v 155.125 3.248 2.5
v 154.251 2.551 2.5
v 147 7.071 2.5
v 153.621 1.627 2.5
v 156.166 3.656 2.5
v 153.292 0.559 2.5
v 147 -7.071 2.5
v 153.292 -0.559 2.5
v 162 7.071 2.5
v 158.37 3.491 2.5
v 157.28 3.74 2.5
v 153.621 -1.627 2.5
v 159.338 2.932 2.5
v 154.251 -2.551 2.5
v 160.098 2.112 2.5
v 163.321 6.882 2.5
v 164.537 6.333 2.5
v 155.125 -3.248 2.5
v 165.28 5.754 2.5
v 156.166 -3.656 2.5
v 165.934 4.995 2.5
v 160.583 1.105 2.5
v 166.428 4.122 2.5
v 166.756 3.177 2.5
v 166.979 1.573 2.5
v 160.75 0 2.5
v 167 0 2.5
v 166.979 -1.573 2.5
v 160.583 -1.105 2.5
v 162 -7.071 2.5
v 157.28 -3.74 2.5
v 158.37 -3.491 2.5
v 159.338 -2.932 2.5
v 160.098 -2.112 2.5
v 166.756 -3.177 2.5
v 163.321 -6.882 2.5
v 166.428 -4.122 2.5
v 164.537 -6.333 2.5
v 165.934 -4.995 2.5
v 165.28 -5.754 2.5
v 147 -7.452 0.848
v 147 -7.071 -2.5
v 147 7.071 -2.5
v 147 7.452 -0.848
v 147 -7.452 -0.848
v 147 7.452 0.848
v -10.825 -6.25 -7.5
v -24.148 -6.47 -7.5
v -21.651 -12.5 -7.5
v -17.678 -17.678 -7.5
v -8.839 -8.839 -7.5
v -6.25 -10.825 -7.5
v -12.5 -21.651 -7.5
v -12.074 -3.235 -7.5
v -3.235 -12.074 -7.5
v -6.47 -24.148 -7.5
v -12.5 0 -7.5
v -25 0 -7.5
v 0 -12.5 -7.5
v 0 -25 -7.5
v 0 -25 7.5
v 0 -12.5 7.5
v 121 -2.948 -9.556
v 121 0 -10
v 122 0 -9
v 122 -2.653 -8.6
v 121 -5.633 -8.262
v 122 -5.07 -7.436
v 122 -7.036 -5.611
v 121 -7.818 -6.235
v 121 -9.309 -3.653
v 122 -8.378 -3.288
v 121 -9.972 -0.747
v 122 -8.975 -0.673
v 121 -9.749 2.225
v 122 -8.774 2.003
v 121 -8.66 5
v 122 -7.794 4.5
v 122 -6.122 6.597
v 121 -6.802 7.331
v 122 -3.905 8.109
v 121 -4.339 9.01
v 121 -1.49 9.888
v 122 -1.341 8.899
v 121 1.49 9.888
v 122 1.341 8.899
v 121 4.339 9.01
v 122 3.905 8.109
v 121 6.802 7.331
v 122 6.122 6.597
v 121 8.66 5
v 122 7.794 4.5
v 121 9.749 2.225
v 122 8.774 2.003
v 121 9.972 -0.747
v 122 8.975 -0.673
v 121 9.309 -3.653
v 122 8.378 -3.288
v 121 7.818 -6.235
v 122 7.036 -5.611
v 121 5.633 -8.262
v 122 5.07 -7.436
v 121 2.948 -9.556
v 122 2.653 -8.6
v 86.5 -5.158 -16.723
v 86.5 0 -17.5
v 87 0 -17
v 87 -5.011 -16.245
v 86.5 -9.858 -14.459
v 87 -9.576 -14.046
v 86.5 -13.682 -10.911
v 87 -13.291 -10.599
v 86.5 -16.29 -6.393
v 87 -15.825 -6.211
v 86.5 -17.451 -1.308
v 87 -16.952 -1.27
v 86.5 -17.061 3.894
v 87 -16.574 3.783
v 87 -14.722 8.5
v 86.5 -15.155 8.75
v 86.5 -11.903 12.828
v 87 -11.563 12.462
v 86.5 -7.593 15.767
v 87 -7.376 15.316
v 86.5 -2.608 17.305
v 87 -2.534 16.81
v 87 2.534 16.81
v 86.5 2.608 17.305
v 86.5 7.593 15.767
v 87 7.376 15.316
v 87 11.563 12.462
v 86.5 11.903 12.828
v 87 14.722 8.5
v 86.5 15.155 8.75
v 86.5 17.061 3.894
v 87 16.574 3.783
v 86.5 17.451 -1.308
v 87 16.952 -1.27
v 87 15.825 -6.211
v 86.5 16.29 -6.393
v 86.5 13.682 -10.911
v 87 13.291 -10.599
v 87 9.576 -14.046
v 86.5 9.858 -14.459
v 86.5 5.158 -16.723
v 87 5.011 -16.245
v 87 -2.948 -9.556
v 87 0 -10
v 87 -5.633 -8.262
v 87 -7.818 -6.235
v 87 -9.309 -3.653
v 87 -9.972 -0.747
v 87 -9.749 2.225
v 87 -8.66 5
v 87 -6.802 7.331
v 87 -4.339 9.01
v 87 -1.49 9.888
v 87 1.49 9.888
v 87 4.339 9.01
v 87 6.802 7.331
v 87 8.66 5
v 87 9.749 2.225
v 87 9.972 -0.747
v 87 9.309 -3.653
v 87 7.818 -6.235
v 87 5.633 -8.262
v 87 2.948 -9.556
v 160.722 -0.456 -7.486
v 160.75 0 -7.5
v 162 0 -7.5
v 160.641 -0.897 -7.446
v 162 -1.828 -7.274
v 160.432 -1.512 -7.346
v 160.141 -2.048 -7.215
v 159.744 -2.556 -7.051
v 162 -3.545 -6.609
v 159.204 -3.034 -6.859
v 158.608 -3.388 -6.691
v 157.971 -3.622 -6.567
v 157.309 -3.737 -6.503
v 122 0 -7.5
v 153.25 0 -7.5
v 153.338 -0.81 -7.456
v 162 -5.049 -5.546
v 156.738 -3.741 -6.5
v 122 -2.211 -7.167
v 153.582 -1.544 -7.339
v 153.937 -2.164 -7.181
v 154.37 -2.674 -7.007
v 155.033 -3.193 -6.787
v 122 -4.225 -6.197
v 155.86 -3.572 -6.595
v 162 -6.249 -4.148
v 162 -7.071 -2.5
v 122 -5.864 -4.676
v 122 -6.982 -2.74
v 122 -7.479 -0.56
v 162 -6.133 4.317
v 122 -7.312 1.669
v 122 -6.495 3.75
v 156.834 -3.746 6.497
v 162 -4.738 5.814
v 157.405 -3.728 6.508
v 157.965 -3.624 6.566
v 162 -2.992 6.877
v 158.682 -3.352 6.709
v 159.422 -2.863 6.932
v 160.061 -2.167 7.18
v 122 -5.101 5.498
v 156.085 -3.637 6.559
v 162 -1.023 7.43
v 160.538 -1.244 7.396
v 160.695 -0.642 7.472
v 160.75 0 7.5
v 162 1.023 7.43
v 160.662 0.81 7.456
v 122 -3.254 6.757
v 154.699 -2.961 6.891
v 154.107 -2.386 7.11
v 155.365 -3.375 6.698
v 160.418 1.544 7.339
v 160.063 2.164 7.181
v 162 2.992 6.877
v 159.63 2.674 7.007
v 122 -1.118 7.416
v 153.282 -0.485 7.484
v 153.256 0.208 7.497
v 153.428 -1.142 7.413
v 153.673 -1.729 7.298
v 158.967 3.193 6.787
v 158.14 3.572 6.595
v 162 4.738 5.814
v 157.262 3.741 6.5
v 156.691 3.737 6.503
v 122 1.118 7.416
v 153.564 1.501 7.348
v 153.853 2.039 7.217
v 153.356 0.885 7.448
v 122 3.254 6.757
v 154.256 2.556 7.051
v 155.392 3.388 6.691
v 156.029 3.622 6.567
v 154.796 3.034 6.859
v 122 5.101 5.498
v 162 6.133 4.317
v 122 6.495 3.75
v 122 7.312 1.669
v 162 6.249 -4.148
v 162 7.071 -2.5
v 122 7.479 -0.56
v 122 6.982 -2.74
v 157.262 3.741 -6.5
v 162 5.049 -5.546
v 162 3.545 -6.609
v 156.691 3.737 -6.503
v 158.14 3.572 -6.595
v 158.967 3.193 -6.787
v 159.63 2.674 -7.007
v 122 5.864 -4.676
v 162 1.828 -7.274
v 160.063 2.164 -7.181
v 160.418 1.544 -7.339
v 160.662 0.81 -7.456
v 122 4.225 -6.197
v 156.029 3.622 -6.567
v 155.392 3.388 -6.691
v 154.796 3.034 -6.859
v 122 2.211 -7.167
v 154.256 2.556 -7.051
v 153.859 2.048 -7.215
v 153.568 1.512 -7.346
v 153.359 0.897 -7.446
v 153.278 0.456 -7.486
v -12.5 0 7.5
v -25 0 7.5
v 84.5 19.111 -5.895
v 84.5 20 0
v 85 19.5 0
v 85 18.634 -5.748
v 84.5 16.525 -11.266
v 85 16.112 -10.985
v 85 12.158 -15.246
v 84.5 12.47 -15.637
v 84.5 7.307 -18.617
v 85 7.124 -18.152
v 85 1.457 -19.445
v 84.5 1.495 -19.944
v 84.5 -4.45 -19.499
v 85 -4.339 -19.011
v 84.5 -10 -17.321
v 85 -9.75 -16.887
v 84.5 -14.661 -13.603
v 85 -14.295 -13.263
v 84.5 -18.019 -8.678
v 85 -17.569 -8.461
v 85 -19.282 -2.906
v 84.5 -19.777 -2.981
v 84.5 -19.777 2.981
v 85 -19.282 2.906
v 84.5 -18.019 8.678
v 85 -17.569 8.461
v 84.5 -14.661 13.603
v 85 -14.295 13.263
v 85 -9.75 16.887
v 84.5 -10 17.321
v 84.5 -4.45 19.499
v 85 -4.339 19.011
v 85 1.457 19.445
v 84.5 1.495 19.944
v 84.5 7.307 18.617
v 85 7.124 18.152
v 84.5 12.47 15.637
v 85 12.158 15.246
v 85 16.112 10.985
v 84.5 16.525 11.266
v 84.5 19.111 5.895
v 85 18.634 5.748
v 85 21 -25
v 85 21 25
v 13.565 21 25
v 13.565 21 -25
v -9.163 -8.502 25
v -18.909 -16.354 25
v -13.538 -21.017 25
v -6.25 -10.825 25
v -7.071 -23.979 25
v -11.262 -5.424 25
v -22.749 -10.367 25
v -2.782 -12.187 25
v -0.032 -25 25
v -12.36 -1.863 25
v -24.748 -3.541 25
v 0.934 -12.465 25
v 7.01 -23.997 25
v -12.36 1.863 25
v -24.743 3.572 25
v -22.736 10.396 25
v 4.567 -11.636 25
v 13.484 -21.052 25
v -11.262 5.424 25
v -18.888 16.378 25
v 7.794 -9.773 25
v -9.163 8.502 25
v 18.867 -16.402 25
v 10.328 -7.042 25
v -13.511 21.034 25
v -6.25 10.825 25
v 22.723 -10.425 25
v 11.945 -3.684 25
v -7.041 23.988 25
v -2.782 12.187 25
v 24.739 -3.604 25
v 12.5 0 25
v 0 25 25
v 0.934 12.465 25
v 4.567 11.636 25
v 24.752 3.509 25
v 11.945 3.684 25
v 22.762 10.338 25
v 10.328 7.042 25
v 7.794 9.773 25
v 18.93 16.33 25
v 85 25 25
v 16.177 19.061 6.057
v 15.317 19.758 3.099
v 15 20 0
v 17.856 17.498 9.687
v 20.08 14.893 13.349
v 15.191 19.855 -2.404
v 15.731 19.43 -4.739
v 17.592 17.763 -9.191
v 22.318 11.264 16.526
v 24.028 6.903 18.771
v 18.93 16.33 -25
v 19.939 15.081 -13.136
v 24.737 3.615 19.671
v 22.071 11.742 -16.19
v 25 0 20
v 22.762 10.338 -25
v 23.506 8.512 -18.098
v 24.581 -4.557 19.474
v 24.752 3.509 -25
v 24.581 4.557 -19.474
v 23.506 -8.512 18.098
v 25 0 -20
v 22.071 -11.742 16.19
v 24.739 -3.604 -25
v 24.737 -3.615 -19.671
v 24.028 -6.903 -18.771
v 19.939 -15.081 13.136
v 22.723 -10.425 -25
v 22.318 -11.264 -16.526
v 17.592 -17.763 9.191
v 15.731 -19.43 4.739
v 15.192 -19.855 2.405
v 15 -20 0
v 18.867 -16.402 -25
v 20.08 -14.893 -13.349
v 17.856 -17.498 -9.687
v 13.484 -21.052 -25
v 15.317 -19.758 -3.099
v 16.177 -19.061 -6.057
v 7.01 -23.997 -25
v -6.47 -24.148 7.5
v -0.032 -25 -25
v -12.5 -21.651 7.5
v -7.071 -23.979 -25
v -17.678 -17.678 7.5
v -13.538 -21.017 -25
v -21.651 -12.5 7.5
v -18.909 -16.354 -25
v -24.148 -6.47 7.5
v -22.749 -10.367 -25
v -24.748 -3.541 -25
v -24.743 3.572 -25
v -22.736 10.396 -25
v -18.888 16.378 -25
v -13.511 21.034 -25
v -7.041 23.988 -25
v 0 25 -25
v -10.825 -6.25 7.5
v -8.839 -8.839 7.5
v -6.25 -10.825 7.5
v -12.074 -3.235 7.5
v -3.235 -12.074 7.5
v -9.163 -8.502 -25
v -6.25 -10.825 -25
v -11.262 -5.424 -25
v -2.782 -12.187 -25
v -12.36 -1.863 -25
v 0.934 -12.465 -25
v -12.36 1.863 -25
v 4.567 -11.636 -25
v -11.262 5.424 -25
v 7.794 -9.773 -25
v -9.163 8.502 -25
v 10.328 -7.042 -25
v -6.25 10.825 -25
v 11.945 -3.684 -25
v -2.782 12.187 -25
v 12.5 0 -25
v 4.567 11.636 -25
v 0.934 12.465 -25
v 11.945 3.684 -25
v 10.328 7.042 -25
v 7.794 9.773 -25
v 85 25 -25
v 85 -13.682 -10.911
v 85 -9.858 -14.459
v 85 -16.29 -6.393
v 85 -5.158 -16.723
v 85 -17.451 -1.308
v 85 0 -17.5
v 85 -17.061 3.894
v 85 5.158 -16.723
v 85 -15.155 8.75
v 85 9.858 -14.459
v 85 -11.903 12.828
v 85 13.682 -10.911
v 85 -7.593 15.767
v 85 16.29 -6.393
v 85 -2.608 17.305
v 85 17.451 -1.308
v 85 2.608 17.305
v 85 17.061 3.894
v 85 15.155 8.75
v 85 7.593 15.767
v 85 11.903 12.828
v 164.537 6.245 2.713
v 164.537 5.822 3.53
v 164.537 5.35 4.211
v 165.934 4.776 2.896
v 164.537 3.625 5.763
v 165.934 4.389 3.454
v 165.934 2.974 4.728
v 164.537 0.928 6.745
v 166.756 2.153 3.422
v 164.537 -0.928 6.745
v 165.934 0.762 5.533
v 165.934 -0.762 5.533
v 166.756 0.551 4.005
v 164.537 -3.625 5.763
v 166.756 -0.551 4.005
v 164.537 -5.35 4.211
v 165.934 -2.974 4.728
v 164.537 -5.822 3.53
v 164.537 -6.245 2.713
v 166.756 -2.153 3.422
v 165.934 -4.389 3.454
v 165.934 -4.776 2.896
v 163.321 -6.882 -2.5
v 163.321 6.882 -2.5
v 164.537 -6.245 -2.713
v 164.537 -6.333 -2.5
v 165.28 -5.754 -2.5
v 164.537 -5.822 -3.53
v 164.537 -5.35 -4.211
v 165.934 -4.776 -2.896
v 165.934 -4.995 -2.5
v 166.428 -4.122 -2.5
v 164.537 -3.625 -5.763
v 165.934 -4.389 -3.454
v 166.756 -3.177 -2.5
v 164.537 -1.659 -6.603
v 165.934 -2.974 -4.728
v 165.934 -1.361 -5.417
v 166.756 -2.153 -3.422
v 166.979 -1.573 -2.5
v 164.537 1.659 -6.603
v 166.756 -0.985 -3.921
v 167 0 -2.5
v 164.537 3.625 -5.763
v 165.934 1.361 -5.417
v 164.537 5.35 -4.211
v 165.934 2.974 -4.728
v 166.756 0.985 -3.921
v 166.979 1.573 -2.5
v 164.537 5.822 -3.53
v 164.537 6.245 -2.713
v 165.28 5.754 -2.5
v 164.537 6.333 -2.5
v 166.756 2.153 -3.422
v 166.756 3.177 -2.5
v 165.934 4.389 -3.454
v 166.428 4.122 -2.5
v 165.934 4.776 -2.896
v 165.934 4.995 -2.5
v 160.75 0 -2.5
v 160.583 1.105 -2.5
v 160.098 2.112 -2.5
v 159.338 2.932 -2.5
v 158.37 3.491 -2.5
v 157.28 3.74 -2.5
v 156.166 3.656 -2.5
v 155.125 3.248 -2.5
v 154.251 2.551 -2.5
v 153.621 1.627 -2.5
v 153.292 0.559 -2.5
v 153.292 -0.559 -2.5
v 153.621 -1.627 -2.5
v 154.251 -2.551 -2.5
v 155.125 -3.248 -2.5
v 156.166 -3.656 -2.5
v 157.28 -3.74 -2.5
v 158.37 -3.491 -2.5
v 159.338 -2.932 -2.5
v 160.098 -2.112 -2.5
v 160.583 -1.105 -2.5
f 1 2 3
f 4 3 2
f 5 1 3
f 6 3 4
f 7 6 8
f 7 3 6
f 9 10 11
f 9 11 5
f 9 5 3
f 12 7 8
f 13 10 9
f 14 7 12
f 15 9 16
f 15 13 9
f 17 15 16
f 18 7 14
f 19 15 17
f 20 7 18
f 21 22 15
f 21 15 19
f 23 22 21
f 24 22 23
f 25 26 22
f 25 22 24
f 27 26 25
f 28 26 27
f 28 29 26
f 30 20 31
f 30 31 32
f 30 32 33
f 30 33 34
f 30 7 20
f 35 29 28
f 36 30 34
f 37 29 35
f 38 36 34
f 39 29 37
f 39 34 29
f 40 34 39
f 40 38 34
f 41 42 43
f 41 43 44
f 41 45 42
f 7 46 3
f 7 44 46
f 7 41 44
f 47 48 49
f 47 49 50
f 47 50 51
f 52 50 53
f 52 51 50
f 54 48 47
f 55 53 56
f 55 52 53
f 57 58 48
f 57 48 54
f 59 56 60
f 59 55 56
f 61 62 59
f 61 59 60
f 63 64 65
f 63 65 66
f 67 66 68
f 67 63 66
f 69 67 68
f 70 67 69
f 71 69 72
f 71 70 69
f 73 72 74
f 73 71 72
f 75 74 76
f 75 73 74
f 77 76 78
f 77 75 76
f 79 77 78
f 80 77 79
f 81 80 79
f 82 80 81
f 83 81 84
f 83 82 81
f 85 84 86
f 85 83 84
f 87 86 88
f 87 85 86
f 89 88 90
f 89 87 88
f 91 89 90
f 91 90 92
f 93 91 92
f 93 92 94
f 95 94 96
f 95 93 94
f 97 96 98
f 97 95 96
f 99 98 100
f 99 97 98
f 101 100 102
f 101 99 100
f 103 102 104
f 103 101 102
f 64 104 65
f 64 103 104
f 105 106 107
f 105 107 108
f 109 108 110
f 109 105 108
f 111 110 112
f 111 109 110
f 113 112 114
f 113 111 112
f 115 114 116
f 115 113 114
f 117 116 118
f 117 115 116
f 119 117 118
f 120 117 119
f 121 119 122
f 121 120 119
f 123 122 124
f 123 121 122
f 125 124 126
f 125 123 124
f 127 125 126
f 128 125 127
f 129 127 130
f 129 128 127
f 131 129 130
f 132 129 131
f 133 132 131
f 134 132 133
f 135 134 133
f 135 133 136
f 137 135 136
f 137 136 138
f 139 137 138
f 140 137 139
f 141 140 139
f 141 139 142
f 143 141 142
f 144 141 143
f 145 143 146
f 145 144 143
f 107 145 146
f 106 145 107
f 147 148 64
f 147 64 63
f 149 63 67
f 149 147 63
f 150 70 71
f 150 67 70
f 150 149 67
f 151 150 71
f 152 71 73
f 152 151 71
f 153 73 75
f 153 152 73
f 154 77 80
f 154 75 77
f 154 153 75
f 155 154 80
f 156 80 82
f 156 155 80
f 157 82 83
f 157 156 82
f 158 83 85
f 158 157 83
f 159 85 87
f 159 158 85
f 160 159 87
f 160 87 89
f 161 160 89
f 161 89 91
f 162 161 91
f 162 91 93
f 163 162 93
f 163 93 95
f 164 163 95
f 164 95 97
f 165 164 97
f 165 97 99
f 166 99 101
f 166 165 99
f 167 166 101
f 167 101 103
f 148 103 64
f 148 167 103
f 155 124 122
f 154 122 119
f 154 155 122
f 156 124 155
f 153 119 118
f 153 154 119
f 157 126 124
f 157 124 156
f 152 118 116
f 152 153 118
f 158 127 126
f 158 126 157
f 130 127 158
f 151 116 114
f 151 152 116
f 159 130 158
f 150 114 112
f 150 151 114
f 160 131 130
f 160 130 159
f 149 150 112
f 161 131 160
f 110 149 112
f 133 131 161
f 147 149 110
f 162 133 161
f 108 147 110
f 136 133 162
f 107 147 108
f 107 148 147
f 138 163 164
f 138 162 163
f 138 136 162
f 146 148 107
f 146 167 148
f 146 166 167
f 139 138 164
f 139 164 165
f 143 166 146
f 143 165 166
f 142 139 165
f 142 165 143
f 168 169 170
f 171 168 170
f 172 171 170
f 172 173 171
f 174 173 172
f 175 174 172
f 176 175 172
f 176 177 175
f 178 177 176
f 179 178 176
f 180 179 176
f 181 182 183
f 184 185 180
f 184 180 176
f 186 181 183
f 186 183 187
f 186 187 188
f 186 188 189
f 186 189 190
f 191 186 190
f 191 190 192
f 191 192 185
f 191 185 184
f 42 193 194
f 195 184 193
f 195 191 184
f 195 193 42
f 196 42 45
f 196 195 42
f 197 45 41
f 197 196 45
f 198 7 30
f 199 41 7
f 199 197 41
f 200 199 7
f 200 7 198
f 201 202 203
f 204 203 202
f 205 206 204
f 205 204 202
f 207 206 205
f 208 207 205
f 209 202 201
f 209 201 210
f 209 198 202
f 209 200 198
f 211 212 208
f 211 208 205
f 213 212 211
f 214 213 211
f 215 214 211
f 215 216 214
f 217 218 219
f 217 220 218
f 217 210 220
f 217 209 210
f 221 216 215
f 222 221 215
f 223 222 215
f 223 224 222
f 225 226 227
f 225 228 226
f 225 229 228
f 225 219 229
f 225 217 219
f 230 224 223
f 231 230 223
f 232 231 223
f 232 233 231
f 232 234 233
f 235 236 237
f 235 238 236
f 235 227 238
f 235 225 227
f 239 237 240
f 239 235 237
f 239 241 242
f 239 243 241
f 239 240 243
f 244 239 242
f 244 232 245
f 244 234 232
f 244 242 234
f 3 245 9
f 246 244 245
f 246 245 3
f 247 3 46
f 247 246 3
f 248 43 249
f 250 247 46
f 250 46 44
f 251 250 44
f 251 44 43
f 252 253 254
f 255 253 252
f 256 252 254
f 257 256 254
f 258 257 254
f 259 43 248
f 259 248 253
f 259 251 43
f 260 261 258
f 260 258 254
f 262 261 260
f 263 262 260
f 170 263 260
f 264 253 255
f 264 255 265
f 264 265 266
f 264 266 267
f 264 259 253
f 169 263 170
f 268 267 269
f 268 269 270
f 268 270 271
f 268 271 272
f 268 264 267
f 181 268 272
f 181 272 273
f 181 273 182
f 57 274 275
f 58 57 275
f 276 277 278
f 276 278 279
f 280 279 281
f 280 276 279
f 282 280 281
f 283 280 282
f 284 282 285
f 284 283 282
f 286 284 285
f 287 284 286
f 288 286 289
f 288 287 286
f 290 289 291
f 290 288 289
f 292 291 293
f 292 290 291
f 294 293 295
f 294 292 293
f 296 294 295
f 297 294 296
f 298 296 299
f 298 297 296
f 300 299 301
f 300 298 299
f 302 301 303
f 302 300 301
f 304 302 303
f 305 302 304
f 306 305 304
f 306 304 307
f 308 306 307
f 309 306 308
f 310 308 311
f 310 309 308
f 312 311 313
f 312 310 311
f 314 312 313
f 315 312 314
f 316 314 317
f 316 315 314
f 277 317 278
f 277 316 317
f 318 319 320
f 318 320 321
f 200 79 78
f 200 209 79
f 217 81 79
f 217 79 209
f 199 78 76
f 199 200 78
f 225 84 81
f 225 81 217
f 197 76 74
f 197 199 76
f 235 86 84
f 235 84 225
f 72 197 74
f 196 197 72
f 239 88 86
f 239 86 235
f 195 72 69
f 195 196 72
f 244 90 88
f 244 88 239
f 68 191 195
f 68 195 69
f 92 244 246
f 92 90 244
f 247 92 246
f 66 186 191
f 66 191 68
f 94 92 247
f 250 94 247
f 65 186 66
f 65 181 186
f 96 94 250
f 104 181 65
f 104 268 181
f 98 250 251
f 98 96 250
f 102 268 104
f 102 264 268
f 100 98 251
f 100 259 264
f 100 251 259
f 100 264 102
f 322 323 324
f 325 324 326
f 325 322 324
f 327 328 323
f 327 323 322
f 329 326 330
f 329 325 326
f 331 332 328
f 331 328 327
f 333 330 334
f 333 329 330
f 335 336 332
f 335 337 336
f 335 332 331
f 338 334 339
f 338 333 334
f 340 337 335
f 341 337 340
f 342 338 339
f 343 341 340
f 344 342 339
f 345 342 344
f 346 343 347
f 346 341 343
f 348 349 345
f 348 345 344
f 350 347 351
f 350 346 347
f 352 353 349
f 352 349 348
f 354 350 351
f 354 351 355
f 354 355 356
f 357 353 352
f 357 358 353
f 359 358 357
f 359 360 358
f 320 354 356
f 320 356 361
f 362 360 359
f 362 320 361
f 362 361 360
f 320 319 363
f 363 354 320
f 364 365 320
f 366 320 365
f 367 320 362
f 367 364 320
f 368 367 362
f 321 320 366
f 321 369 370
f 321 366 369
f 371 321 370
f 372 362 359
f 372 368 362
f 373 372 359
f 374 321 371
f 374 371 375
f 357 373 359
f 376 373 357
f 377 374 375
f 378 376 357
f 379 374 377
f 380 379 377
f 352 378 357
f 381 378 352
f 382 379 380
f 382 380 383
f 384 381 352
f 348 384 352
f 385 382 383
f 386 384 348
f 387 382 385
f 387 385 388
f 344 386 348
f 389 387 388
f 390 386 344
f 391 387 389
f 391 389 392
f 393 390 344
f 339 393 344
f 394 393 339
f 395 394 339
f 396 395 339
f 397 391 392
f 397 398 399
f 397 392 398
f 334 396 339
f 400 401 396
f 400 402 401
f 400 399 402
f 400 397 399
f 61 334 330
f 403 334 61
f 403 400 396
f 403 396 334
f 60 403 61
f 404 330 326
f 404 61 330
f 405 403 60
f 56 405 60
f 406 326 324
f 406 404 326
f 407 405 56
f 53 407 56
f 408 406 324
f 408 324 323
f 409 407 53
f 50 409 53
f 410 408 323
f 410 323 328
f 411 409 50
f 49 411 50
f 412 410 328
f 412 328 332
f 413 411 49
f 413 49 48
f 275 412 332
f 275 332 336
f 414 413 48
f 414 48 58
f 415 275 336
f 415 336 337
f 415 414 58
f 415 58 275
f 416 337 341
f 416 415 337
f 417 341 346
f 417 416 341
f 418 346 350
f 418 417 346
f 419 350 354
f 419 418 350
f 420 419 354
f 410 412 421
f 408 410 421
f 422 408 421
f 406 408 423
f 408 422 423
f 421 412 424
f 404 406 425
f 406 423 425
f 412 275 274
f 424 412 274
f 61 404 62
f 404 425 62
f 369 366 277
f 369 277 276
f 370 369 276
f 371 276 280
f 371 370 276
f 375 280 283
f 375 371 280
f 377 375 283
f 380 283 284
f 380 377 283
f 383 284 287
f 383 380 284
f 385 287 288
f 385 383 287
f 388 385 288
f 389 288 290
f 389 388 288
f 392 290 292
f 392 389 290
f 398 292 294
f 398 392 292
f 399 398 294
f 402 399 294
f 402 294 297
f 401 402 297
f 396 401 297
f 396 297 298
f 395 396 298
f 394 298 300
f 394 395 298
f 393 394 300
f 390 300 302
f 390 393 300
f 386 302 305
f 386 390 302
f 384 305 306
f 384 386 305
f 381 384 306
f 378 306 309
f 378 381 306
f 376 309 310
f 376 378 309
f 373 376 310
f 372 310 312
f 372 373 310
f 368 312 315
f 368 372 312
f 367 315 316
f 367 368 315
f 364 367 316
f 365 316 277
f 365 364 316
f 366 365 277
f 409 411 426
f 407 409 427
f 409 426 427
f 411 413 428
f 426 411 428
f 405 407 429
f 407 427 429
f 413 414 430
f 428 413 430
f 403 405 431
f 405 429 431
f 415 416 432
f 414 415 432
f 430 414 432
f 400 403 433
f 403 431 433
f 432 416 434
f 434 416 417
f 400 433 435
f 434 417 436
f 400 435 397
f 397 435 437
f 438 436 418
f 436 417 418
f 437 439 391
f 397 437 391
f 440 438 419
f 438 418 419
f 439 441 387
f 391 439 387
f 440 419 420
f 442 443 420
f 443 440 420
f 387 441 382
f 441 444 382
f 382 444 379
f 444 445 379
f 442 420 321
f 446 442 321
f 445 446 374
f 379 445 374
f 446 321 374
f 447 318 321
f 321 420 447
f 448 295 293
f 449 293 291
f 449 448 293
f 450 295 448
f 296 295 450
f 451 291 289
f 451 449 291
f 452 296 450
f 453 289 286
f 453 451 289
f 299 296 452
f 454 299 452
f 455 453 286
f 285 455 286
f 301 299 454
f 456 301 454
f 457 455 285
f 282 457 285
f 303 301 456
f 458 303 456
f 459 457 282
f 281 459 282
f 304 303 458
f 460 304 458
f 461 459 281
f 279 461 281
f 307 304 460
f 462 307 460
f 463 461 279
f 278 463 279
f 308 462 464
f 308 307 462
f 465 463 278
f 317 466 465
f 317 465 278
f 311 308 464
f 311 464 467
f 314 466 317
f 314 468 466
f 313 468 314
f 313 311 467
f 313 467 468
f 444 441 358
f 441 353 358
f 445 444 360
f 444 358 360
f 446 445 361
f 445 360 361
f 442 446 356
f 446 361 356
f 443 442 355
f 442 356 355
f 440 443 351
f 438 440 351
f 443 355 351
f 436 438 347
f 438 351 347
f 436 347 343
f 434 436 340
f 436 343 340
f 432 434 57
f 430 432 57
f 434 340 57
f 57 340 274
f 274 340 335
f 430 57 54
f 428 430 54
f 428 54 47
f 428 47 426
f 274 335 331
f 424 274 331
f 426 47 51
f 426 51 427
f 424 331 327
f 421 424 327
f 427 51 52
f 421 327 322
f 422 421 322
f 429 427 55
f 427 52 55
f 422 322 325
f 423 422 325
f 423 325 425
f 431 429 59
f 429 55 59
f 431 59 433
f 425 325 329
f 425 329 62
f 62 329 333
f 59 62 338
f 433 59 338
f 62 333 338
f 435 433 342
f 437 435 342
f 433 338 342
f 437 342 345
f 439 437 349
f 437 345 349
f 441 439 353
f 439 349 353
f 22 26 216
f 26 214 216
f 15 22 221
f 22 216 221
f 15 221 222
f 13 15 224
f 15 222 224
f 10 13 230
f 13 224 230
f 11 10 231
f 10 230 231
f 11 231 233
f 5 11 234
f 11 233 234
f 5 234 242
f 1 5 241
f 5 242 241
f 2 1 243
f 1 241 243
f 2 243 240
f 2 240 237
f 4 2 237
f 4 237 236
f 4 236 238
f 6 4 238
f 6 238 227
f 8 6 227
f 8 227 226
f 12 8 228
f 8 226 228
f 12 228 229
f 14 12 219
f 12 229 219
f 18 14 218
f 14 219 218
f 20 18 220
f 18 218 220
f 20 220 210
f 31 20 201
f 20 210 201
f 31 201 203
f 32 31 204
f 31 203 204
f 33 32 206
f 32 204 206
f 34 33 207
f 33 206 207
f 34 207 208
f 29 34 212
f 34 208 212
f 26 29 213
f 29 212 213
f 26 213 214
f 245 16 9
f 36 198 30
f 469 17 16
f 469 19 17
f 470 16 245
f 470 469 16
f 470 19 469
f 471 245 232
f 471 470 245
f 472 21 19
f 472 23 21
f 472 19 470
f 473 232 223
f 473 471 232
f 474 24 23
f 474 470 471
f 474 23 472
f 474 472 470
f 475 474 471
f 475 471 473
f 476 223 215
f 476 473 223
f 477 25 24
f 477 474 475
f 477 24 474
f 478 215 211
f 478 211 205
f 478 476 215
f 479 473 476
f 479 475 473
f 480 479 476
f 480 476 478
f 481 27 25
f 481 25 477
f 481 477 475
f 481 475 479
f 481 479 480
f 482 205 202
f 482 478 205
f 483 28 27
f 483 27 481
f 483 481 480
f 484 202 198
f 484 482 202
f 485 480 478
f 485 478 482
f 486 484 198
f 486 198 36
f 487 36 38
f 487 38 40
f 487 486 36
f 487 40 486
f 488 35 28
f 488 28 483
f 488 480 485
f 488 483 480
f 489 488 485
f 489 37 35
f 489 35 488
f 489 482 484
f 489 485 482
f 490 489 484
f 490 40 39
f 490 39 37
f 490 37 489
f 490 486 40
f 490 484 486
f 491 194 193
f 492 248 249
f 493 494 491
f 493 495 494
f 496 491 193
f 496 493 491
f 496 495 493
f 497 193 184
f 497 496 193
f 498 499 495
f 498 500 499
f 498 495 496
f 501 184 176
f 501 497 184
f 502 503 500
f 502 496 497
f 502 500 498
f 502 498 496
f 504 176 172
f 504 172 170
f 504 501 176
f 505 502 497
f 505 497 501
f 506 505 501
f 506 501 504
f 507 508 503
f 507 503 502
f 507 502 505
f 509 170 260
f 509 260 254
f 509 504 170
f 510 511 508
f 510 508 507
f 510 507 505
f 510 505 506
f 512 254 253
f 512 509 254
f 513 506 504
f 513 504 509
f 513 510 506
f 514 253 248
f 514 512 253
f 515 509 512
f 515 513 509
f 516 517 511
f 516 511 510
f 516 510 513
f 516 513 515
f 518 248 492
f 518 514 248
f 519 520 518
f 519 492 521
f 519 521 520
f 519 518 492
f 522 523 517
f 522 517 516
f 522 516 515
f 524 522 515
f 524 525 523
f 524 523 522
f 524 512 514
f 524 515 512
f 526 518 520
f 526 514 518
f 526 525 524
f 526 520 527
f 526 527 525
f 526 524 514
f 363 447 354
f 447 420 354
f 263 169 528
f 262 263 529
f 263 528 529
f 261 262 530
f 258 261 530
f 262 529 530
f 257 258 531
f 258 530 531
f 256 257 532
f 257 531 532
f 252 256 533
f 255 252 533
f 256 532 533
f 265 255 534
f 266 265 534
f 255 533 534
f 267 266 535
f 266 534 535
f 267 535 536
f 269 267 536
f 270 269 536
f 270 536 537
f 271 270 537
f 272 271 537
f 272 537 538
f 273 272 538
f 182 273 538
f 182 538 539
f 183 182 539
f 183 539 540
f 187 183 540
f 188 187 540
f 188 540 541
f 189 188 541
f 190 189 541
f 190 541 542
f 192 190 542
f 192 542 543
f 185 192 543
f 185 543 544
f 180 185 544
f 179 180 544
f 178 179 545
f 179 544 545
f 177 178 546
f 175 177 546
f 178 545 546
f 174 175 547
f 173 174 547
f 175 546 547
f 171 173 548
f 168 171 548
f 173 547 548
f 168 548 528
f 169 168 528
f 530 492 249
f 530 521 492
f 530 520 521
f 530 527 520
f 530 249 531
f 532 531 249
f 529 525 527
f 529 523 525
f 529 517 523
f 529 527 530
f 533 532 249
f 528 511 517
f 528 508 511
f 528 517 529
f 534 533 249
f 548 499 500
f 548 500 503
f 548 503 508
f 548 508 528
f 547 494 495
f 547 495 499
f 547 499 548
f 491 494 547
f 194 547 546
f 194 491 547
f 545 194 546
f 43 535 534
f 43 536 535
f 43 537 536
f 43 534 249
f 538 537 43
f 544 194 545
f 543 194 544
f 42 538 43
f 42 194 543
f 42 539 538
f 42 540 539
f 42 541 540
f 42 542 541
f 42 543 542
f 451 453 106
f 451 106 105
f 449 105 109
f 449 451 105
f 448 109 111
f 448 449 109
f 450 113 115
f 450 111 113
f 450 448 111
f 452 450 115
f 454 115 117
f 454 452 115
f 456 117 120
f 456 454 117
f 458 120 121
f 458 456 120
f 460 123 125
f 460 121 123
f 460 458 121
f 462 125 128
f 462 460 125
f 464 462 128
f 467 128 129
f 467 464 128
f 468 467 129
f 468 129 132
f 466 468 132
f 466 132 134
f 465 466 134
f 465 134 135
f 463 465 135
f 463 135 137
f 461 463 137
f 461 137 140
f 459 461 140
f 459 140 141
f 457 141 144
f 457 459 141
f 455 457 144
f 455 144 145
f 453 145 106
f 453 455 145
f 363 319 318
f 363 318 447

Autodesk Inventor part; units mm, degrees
ref_plane "YZ Plane" through (0, 0, 0) normal (1, 0, 0) x (0, 1, 0)
ref_plane "XZ Plane" through (0, 0, 0) normal (0, 1, 0) x (-1, 0, 0)
ref_plane "XY Plane" through (0, 0, 0) normal (0, 0, 1) x (1, 0, 0)
sketch "Sketch1" plane through (0, 0, 0) normal (0, 0, 1) x (1, 0, 0)
  circle A0 centre (0, 0) radius 25
  dimension "d0" = 50
extrude "Extrusion1" add sketch "Sketch1" along normal mid plane 50
sketch "Sketch2" plane through (0, 0, 0) normal (1, 0, 0) x (0, 1, 0)
  circle A0 centre (0, 0) radius 20
  line L0 (25, 25) -> (-25, 25) projected
  line L1 (-25, -25) -> (25, -25) projected
  line L2 (25, 25) -> (21, 25)
  line L3 (21, 25) -> (21, -25)
  line L4 (21, -25) -> (25, -25)
  line L5 (25, -25) -> (25, 25)
  dimension "d3" = 40
  dimension "d4" = 4
extrude "Extrusion2" add sketch "Sketch2" along normal blind 85
sketch "Sketch3" plane through (0, 0, 0) normal (0, 0, 1) x (1, 0, 0)
  circle A0 centre (0, 0) radius 12.5
  dimension "d7" = 25
extrude "Extrusion3" cut sketch "Sketch3" along normal through all both and the other way through all
sketch "Sketch4" plane through (85, 0, 0) normal (1, 0, 0) x (0, 0, -1)
  circle A0 centre (0, 0) radius 17.5
  dimension "d10" = 35
extrude "Extrusion4" add sketch "Sketch4" along normal blind 2
sketch "Sketch5" plane through (87, 0, 0) normal (1, 0, 0) x (0, 0, -1)
  circle A0 centre (0, 0) radius 10
  dimension "d13" = 20
extrude "Extrusion5" add sketch "Sketch5" along normal blind 35
sketch "Sketch6" plane through (122, 0, 0) normal (1, 0, 0) x (0, 0, -1)
  circle A0 centre (0, 0) radius 7.5
  dimension "d16" = 15
extrude "Extrusion6" add sketch "Sketch6" along normal blind 45
sketch "Sketch7" plane through (0, 0, 0) normal (0, 0, 1) x (1, 0, 0)
  circle A0 centre (157, 0) radius 3.75
  line L0 (167, -7.5) -> (167, 7.5) projected
  point P0 (0, 0)
  dimension "d19" = 7.5
  dimension "d20" = 10
extrude "Extrusion7" cut sketch "Sketch7" along normal through all both and the other way through all
chamfer "Chamfer1" distance 0.5 angle 45 2 edges at (85, -20, 0) (87, 0, 17.5)
chamfer "Chamfer2" distance 1 angle 45 1 edges at (122, 0, 10)
fillet "Fillet1" radius 5 1 edges at (167, 0, 7.5)
sketch "Sketch8" plane through (0, 0, 0) normal (0, 0, 1) x (1, 0, 0)
  arc A0 (-12.5, 0) -> (0, -12.5) centre (0, 0) ccw
  arc A1 (-25, 0) -> (0, -25) centre (0, 0) ccw
  line L0 (0, 0) -> (-25, 0)
  line L1 (0, 0) -> (0, -25)
  dimension "d30" = 25
  dimension "d31" = 50
extrude "Extrusion8" cut sketch "Sketch8" along normal mid plane 15 contours A0 L1 A1 L0
sketch "Sketch9" plane through (0, 0, 0) normal (0, 1, 0) x (-1, 0, 0)
  line L0 (-167, -2.5) -> (-167, 2.5) projected
  line L1 (-167, -2.5) -> (-147, -2.5)
  line L2 (-147, -2.5) -> (-147, 2.5)
  line L3 (-147, 2.5) -> (-167, 2.5)
  point P0 (0, 0)
  dimension "d34" = 20
extrude "Extrusion9" cut sketch "Sketch9" along normal through all both and the other way through all
properties part number "Hydraulic Arm"
